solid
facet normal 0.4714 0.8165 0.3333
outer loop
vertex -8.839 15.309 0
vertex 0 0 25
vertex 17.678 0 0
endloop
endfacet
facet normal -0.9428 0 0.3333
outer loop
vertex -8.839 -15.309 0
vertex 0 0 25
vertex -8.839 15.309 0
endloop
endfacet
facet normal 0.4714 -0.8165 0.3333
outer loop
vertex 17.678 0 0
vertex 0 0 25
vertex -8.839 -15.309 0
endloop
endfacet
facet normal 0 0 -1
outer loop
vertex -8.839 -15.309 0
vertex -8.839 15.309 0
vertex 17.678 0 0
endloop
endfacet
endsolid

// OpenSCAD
base = 30;
height = 25;
a = 3*height/sqrt(6);
$fn = 50;


cylinder(r1=sqrt(3)*a/3,d2=0,h=height,$fn=3);
